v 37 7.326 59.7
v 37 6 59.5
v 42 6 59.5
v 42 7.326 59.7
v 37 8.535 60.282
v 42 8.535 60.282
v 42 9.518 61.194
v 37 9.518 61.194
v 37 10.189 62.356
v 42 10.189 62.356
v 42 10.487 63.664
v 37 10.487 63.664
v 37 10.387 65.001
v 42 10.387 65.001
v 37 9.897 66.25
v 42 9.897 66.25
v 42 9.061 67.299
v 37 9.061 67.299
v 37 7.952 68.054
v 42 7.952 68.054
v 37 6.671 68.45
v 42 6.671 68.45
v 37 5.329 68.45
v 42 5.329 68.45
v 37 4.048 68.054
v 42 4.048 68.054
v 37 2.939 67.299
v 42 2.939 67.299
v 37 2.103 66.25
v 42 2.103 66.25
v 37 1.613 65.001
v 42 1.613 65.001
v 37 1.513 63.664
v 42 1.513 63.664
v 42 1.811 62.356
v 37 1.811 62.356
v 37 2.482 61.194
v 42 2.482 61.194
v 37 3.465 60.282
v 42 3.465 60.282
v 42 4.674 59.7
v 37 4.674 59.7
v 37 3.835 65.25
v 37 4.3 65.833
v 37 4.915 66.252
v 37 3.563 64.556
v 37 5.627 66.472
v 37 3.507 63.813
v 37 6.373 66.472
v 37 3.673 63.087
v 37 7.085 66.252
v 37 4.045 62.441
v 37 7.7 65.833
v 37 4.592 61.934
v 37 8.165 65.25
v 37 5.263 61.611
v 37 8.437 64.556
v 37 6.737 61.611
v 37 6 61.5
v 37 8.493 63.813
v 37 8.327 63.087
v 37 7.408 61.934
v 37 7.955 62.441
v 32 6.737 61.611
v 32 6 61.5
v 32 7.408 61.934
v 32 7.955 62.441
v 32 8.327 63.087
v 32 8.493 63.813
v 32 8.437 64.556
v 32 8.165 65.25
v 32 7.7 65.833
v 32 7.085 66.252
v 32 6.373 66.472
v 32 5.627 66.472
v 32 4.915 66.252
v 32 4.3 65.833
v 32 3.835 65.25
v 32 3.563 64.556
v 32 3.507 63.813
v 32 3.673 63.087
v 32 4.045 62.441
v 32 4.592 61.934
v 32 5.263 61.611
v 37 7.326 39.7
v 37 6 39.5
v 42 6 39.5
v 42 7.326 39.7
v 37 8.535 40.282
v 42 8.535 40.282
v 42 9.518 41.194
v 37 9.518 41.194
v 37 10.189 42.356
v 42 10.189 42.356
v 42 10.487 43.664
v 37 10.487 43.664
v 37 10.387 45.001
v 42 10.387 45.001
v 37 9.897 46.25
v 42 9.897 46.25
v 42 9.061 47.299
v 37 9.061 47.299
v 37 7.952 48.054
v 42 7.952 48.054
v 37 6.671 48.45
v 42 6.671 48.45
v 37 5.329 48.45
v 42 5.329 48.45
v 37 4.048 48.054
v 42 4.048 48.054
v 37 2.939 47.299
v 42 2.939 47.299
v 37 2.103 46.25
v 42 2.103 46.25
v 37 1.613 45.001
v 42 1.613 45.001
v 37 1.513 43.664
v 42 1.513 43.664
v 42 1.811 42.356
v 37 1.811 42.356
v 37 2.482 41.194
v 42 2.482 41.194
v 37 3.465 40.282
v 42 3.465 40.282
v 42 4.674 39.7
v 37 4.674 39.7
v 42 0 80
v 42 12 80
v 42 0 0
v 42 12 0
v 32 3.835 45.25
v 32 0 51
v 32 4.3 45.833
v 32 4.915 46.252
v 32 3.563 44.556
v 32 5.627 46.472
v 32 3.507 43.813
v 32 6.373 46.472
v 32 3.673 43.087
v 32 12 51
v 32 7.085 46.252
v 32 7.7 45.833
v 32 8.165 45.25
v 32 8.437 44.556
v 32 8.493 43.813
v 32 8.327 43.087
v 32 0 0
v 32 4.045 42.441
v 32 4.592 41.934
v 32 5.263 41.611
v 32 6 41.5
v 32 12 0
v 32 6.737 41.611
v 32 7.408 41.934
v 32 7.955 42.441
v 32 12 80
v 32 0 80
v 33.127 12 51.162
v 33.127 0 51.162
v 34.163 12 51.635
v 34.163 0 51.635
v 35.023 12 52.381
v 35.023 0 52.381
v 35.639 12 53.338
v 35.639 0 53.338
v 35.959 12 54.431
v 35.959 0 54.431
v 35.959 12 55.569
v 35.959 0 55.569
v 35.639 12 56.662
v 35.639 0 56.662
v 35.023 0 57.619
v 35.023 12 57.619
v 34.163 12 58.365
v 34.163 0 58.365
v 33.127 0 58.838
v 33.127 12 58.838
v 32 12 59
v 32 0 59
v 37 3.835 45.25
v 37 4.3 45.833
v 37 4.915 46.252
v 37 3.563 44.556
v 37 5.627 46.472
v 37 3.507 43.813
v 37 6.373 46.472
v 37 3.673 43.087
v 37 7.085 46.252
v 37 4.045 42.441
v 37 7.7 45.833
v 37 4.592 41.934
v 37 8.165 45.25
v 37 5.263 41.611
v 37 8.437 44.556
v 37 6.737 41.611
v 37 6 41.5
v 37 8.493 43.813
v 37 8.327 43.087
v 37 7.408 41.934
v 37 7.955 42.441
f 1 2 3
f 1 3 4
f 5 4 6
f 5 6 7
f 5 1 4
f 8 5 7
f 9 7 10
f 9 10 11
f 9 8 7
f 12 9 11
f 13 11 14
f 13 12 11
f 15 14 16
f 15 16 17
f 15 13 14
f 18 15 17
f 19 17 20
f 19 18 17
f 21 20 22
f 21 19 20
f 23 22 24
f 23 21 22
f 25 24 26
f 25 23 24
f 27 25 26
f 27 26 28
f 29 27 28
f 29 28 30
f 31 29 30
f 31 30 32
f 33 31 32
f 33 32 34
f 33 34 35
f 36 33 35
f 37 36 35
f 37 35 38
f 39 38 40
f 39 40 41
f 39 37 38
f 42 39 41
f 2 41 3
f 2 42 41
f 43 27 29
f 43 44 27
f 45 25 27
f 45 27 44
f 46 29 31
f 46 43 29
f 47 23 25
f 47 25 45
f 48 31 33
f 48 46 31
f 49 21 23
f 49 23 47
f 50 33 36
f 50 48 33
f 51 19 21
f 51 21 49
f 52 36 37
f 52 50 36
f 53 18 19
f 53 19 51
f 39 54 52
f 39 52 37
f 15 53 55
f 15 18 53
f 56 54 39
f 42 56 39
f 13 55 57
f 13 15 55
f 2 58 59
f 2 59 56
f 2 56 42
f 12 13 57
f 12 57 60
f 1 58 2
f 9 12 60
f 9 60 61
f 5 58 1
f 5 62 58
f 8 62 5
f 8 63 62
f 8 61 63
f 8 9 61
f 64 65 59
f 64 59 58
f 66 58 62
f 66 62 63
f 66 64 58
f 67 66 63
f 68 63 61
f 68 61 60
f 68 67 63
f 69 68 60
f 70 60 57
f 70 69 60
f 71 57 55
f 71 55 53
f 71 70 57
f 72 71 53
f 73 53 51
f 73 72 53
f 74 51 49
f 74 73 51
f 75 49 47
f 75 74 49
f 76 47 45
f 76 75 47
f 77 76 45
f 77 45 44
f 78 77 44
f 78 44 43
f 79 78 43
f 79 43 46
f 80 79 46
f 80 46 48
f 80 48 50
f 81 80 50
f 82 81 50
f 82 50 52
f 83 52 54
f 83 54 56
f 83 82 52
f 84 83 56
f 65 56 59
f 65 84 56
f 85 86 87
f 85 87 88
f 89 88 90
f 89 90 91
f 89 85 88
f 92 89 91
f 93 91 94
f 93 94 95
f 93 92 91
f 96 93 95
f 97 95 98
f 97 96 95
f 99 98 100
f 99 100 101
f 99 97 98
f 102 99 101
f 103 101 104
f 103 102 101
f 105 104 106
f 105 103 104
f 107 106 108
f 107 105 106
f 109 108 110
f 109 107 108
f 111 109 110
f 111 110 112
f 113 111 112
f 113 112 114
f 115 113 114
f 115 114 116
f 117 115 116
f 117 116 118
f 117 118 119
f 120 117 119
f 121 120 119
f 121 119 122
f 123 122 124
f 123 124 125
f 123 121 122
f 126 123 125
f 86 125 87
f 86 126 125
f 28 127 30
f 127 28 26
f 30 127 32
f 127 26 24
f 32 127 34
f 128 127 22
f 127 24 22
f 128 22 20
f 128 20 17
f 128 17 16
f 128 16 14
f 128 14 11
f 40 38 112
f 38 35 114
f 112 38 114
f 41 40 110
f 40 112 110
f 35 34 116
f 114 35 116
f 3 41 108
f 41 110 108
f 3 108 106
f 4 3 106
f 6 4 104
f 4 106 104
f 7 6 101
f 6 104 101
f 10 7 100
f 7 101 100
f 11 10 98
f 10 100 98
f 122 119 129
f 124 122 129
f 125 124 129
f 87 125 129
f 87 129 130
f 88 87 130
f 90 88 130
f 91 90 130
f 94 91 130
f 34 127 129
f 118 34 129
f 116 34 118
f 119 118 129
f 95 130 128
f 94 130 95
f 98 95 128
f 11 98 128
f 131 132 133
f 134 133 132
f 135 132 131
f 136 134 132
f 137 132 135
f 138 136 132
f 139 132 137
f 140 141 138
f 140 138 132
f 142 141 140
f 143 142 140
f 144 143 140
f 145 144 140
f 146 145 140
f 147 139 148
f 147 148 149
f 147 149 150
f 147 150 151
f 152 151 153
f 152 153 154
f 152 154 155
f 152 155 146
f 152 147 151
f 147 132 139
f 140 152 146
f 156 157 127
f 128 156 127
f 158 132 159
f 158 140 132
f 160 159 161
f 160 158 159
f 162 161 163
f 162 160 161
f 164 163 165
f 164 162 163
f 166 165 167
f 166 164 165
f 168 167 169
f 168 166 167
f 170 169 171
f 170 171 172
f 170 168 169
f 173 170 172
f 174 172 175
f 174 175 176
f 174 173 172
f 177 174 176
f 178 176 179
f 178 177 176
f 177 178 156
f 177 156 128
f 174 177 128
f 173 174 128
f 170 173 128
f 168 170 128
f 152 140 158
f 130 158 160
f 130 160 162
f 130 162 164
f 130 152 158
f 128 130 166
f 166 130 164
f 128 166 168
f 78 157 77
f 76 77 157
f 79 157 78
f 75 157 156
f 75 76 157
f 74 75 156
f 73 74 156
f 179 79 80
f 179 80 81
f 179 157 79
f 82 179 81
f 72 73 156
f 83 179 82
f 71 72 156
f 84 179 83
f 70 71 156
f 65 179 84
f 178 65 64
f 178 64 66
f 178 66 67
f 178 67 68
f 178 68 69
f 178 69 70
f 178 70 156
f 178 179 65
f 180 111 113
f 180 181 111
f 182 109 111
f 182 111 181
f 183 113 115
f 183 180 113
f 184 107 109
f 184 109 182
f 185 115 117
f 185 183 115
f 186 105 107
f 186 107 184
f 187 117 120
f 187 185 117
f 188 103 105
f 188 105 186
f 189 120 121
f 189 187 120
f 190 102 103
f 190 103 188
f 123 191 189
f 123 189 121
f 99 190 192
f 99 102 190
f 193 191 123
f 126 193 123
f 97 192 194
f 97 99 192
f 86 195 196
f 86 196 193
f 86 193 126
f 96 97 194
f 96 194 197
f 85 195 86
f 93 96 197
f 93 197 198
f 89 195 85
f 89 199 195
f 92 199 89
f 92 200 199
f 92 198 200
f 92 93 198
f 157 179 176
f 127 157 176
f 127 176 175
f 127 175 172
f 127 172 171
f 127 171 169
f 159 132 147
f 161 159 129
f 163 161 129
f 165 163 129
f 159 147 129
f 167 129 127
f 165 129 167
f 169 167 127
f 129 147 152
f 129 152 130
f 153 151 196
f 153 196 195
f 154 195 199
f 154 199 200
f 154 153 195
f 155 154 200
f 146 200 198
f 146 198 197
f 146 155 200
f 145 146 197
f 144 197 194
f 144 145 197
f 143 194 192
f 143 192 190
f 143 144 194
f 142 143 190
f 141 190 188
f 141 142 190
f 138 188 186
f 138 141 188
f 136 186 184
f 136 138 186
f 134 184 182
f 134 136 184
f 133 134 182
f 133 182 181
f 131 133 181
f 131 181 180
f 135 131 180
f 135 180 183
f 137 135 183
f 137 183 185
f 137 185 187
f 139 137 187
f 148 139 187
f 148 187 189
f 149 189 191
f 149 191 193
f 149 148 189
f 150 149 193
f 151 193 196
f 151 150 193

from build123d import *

# Parameters (mm, degrees)
CYLINDER010_R     = 4
CYLINDER010_DEPTH = 12
CYLINDER006_R     = 4.5
CYLINDER006_DEPTH = 5
CYLINDER005_R     = 2.5
CYLINDER005_DEPTH = 5
CYLINDER012_R     = 4.5
CYLINDER012_DEPTH = 5
CYLINDER011_R     = 2.5
CYLINDER011_DEPTH = 5
BOX_W             = 10
BOX_H             = 12
BOX_DEPTH         = 80


with BuildPart() as cylinder010:
    # Cylinder010 → Cylinder010 (new body)
    with BuildSketch(Plane(origin=(32, 12, 55), x_dir=(1, 0, 0), z_dir=(0, -1, 0))):
        Circle(CYLINDER010_R)
    extrude(amount=CYLINDER010_DEPTH)


with BuildPart() as cylinder006:
    # Cylinder006 → Cylinder006 (new body)
    with BuildSketch(Plane(origin=(37, 5, 55), x_dir=(0, 0, -1), z_dir=(1, 0, 0))):
        Circle(CYLINDER006_R)
    extrude(amount=CYLINDER006_DEPTH)


with BuildPart() as crewhole1:
    # Cylinder005 → Cylinder005 (new body)
    with BuildSketch(Plane(origin=(32, 5, 55), x_dir=(0, 0, -1), z_dir=(1, 0, 0))):
        Circle(CYLINDER005_R)
    extrude(amount=CYLINDER005_DEPTH)

    # Fusion003: union Cylinder006
    add(cylinder006.part)


with BuildPart() as crewhole1_1:
    # Fusion003 placement: moved
    add(crewhole1.part.moved(Location((0, 1, 9))))


with BuildPart() as cylinder012:
    # Cylinder012 → Cylinder012 (new body)
    with BuildSketch(Plane(origin=(37, 5, 55), x_dir=(0, 0, -1), z_dir=(1, 0, 0))):
        Circle(CYLINDER012_R)
    extrude(amount=CYLINDER012_DEPTH)


with BuildPart() as screwholes:
    # Cylinder011 → Cylinder011 (new body)
    with BuildSketch(Plane(origin=(32, 5, 55), x_dir=(0, 0, -1), z_dir=(1, 0, 0))):
        Circle(CYLINDER011_R)
    extrude(amount=CYLINDER011_DEPTH)

    # Fusion004: union Cylinder012
    add(cylinder012.part)


with BuildPart() as screwholes_1:
    # Fusion004 placement: moved
    add(screwholes.part.moved(Location((0, 1, -11))))

    # Fusion005: union CrewHole1
    add(crewhole1_1.part)


with BuildPart() as clampsideb:
    # Box → Box (new body)
    with BuildSketch(Plane(origin=(32, 0, 0), x_dir=(1, 0, 0), z_dir=(0, 0, 1))):
        with Locations((5, 6)):
            Rectangle(BOX_W, BOX_H)
    extrude(amount=BOX_DEPTH)

    # Cut: cut ScrewHoles
    add(screwholes_1.part, mode=Mode.SUBTRACT)

    # Cut007: cut Cylinder010
    add(cylinder010.part, mode=Mode.SUBTRACT)


solid = clampsideb.part
